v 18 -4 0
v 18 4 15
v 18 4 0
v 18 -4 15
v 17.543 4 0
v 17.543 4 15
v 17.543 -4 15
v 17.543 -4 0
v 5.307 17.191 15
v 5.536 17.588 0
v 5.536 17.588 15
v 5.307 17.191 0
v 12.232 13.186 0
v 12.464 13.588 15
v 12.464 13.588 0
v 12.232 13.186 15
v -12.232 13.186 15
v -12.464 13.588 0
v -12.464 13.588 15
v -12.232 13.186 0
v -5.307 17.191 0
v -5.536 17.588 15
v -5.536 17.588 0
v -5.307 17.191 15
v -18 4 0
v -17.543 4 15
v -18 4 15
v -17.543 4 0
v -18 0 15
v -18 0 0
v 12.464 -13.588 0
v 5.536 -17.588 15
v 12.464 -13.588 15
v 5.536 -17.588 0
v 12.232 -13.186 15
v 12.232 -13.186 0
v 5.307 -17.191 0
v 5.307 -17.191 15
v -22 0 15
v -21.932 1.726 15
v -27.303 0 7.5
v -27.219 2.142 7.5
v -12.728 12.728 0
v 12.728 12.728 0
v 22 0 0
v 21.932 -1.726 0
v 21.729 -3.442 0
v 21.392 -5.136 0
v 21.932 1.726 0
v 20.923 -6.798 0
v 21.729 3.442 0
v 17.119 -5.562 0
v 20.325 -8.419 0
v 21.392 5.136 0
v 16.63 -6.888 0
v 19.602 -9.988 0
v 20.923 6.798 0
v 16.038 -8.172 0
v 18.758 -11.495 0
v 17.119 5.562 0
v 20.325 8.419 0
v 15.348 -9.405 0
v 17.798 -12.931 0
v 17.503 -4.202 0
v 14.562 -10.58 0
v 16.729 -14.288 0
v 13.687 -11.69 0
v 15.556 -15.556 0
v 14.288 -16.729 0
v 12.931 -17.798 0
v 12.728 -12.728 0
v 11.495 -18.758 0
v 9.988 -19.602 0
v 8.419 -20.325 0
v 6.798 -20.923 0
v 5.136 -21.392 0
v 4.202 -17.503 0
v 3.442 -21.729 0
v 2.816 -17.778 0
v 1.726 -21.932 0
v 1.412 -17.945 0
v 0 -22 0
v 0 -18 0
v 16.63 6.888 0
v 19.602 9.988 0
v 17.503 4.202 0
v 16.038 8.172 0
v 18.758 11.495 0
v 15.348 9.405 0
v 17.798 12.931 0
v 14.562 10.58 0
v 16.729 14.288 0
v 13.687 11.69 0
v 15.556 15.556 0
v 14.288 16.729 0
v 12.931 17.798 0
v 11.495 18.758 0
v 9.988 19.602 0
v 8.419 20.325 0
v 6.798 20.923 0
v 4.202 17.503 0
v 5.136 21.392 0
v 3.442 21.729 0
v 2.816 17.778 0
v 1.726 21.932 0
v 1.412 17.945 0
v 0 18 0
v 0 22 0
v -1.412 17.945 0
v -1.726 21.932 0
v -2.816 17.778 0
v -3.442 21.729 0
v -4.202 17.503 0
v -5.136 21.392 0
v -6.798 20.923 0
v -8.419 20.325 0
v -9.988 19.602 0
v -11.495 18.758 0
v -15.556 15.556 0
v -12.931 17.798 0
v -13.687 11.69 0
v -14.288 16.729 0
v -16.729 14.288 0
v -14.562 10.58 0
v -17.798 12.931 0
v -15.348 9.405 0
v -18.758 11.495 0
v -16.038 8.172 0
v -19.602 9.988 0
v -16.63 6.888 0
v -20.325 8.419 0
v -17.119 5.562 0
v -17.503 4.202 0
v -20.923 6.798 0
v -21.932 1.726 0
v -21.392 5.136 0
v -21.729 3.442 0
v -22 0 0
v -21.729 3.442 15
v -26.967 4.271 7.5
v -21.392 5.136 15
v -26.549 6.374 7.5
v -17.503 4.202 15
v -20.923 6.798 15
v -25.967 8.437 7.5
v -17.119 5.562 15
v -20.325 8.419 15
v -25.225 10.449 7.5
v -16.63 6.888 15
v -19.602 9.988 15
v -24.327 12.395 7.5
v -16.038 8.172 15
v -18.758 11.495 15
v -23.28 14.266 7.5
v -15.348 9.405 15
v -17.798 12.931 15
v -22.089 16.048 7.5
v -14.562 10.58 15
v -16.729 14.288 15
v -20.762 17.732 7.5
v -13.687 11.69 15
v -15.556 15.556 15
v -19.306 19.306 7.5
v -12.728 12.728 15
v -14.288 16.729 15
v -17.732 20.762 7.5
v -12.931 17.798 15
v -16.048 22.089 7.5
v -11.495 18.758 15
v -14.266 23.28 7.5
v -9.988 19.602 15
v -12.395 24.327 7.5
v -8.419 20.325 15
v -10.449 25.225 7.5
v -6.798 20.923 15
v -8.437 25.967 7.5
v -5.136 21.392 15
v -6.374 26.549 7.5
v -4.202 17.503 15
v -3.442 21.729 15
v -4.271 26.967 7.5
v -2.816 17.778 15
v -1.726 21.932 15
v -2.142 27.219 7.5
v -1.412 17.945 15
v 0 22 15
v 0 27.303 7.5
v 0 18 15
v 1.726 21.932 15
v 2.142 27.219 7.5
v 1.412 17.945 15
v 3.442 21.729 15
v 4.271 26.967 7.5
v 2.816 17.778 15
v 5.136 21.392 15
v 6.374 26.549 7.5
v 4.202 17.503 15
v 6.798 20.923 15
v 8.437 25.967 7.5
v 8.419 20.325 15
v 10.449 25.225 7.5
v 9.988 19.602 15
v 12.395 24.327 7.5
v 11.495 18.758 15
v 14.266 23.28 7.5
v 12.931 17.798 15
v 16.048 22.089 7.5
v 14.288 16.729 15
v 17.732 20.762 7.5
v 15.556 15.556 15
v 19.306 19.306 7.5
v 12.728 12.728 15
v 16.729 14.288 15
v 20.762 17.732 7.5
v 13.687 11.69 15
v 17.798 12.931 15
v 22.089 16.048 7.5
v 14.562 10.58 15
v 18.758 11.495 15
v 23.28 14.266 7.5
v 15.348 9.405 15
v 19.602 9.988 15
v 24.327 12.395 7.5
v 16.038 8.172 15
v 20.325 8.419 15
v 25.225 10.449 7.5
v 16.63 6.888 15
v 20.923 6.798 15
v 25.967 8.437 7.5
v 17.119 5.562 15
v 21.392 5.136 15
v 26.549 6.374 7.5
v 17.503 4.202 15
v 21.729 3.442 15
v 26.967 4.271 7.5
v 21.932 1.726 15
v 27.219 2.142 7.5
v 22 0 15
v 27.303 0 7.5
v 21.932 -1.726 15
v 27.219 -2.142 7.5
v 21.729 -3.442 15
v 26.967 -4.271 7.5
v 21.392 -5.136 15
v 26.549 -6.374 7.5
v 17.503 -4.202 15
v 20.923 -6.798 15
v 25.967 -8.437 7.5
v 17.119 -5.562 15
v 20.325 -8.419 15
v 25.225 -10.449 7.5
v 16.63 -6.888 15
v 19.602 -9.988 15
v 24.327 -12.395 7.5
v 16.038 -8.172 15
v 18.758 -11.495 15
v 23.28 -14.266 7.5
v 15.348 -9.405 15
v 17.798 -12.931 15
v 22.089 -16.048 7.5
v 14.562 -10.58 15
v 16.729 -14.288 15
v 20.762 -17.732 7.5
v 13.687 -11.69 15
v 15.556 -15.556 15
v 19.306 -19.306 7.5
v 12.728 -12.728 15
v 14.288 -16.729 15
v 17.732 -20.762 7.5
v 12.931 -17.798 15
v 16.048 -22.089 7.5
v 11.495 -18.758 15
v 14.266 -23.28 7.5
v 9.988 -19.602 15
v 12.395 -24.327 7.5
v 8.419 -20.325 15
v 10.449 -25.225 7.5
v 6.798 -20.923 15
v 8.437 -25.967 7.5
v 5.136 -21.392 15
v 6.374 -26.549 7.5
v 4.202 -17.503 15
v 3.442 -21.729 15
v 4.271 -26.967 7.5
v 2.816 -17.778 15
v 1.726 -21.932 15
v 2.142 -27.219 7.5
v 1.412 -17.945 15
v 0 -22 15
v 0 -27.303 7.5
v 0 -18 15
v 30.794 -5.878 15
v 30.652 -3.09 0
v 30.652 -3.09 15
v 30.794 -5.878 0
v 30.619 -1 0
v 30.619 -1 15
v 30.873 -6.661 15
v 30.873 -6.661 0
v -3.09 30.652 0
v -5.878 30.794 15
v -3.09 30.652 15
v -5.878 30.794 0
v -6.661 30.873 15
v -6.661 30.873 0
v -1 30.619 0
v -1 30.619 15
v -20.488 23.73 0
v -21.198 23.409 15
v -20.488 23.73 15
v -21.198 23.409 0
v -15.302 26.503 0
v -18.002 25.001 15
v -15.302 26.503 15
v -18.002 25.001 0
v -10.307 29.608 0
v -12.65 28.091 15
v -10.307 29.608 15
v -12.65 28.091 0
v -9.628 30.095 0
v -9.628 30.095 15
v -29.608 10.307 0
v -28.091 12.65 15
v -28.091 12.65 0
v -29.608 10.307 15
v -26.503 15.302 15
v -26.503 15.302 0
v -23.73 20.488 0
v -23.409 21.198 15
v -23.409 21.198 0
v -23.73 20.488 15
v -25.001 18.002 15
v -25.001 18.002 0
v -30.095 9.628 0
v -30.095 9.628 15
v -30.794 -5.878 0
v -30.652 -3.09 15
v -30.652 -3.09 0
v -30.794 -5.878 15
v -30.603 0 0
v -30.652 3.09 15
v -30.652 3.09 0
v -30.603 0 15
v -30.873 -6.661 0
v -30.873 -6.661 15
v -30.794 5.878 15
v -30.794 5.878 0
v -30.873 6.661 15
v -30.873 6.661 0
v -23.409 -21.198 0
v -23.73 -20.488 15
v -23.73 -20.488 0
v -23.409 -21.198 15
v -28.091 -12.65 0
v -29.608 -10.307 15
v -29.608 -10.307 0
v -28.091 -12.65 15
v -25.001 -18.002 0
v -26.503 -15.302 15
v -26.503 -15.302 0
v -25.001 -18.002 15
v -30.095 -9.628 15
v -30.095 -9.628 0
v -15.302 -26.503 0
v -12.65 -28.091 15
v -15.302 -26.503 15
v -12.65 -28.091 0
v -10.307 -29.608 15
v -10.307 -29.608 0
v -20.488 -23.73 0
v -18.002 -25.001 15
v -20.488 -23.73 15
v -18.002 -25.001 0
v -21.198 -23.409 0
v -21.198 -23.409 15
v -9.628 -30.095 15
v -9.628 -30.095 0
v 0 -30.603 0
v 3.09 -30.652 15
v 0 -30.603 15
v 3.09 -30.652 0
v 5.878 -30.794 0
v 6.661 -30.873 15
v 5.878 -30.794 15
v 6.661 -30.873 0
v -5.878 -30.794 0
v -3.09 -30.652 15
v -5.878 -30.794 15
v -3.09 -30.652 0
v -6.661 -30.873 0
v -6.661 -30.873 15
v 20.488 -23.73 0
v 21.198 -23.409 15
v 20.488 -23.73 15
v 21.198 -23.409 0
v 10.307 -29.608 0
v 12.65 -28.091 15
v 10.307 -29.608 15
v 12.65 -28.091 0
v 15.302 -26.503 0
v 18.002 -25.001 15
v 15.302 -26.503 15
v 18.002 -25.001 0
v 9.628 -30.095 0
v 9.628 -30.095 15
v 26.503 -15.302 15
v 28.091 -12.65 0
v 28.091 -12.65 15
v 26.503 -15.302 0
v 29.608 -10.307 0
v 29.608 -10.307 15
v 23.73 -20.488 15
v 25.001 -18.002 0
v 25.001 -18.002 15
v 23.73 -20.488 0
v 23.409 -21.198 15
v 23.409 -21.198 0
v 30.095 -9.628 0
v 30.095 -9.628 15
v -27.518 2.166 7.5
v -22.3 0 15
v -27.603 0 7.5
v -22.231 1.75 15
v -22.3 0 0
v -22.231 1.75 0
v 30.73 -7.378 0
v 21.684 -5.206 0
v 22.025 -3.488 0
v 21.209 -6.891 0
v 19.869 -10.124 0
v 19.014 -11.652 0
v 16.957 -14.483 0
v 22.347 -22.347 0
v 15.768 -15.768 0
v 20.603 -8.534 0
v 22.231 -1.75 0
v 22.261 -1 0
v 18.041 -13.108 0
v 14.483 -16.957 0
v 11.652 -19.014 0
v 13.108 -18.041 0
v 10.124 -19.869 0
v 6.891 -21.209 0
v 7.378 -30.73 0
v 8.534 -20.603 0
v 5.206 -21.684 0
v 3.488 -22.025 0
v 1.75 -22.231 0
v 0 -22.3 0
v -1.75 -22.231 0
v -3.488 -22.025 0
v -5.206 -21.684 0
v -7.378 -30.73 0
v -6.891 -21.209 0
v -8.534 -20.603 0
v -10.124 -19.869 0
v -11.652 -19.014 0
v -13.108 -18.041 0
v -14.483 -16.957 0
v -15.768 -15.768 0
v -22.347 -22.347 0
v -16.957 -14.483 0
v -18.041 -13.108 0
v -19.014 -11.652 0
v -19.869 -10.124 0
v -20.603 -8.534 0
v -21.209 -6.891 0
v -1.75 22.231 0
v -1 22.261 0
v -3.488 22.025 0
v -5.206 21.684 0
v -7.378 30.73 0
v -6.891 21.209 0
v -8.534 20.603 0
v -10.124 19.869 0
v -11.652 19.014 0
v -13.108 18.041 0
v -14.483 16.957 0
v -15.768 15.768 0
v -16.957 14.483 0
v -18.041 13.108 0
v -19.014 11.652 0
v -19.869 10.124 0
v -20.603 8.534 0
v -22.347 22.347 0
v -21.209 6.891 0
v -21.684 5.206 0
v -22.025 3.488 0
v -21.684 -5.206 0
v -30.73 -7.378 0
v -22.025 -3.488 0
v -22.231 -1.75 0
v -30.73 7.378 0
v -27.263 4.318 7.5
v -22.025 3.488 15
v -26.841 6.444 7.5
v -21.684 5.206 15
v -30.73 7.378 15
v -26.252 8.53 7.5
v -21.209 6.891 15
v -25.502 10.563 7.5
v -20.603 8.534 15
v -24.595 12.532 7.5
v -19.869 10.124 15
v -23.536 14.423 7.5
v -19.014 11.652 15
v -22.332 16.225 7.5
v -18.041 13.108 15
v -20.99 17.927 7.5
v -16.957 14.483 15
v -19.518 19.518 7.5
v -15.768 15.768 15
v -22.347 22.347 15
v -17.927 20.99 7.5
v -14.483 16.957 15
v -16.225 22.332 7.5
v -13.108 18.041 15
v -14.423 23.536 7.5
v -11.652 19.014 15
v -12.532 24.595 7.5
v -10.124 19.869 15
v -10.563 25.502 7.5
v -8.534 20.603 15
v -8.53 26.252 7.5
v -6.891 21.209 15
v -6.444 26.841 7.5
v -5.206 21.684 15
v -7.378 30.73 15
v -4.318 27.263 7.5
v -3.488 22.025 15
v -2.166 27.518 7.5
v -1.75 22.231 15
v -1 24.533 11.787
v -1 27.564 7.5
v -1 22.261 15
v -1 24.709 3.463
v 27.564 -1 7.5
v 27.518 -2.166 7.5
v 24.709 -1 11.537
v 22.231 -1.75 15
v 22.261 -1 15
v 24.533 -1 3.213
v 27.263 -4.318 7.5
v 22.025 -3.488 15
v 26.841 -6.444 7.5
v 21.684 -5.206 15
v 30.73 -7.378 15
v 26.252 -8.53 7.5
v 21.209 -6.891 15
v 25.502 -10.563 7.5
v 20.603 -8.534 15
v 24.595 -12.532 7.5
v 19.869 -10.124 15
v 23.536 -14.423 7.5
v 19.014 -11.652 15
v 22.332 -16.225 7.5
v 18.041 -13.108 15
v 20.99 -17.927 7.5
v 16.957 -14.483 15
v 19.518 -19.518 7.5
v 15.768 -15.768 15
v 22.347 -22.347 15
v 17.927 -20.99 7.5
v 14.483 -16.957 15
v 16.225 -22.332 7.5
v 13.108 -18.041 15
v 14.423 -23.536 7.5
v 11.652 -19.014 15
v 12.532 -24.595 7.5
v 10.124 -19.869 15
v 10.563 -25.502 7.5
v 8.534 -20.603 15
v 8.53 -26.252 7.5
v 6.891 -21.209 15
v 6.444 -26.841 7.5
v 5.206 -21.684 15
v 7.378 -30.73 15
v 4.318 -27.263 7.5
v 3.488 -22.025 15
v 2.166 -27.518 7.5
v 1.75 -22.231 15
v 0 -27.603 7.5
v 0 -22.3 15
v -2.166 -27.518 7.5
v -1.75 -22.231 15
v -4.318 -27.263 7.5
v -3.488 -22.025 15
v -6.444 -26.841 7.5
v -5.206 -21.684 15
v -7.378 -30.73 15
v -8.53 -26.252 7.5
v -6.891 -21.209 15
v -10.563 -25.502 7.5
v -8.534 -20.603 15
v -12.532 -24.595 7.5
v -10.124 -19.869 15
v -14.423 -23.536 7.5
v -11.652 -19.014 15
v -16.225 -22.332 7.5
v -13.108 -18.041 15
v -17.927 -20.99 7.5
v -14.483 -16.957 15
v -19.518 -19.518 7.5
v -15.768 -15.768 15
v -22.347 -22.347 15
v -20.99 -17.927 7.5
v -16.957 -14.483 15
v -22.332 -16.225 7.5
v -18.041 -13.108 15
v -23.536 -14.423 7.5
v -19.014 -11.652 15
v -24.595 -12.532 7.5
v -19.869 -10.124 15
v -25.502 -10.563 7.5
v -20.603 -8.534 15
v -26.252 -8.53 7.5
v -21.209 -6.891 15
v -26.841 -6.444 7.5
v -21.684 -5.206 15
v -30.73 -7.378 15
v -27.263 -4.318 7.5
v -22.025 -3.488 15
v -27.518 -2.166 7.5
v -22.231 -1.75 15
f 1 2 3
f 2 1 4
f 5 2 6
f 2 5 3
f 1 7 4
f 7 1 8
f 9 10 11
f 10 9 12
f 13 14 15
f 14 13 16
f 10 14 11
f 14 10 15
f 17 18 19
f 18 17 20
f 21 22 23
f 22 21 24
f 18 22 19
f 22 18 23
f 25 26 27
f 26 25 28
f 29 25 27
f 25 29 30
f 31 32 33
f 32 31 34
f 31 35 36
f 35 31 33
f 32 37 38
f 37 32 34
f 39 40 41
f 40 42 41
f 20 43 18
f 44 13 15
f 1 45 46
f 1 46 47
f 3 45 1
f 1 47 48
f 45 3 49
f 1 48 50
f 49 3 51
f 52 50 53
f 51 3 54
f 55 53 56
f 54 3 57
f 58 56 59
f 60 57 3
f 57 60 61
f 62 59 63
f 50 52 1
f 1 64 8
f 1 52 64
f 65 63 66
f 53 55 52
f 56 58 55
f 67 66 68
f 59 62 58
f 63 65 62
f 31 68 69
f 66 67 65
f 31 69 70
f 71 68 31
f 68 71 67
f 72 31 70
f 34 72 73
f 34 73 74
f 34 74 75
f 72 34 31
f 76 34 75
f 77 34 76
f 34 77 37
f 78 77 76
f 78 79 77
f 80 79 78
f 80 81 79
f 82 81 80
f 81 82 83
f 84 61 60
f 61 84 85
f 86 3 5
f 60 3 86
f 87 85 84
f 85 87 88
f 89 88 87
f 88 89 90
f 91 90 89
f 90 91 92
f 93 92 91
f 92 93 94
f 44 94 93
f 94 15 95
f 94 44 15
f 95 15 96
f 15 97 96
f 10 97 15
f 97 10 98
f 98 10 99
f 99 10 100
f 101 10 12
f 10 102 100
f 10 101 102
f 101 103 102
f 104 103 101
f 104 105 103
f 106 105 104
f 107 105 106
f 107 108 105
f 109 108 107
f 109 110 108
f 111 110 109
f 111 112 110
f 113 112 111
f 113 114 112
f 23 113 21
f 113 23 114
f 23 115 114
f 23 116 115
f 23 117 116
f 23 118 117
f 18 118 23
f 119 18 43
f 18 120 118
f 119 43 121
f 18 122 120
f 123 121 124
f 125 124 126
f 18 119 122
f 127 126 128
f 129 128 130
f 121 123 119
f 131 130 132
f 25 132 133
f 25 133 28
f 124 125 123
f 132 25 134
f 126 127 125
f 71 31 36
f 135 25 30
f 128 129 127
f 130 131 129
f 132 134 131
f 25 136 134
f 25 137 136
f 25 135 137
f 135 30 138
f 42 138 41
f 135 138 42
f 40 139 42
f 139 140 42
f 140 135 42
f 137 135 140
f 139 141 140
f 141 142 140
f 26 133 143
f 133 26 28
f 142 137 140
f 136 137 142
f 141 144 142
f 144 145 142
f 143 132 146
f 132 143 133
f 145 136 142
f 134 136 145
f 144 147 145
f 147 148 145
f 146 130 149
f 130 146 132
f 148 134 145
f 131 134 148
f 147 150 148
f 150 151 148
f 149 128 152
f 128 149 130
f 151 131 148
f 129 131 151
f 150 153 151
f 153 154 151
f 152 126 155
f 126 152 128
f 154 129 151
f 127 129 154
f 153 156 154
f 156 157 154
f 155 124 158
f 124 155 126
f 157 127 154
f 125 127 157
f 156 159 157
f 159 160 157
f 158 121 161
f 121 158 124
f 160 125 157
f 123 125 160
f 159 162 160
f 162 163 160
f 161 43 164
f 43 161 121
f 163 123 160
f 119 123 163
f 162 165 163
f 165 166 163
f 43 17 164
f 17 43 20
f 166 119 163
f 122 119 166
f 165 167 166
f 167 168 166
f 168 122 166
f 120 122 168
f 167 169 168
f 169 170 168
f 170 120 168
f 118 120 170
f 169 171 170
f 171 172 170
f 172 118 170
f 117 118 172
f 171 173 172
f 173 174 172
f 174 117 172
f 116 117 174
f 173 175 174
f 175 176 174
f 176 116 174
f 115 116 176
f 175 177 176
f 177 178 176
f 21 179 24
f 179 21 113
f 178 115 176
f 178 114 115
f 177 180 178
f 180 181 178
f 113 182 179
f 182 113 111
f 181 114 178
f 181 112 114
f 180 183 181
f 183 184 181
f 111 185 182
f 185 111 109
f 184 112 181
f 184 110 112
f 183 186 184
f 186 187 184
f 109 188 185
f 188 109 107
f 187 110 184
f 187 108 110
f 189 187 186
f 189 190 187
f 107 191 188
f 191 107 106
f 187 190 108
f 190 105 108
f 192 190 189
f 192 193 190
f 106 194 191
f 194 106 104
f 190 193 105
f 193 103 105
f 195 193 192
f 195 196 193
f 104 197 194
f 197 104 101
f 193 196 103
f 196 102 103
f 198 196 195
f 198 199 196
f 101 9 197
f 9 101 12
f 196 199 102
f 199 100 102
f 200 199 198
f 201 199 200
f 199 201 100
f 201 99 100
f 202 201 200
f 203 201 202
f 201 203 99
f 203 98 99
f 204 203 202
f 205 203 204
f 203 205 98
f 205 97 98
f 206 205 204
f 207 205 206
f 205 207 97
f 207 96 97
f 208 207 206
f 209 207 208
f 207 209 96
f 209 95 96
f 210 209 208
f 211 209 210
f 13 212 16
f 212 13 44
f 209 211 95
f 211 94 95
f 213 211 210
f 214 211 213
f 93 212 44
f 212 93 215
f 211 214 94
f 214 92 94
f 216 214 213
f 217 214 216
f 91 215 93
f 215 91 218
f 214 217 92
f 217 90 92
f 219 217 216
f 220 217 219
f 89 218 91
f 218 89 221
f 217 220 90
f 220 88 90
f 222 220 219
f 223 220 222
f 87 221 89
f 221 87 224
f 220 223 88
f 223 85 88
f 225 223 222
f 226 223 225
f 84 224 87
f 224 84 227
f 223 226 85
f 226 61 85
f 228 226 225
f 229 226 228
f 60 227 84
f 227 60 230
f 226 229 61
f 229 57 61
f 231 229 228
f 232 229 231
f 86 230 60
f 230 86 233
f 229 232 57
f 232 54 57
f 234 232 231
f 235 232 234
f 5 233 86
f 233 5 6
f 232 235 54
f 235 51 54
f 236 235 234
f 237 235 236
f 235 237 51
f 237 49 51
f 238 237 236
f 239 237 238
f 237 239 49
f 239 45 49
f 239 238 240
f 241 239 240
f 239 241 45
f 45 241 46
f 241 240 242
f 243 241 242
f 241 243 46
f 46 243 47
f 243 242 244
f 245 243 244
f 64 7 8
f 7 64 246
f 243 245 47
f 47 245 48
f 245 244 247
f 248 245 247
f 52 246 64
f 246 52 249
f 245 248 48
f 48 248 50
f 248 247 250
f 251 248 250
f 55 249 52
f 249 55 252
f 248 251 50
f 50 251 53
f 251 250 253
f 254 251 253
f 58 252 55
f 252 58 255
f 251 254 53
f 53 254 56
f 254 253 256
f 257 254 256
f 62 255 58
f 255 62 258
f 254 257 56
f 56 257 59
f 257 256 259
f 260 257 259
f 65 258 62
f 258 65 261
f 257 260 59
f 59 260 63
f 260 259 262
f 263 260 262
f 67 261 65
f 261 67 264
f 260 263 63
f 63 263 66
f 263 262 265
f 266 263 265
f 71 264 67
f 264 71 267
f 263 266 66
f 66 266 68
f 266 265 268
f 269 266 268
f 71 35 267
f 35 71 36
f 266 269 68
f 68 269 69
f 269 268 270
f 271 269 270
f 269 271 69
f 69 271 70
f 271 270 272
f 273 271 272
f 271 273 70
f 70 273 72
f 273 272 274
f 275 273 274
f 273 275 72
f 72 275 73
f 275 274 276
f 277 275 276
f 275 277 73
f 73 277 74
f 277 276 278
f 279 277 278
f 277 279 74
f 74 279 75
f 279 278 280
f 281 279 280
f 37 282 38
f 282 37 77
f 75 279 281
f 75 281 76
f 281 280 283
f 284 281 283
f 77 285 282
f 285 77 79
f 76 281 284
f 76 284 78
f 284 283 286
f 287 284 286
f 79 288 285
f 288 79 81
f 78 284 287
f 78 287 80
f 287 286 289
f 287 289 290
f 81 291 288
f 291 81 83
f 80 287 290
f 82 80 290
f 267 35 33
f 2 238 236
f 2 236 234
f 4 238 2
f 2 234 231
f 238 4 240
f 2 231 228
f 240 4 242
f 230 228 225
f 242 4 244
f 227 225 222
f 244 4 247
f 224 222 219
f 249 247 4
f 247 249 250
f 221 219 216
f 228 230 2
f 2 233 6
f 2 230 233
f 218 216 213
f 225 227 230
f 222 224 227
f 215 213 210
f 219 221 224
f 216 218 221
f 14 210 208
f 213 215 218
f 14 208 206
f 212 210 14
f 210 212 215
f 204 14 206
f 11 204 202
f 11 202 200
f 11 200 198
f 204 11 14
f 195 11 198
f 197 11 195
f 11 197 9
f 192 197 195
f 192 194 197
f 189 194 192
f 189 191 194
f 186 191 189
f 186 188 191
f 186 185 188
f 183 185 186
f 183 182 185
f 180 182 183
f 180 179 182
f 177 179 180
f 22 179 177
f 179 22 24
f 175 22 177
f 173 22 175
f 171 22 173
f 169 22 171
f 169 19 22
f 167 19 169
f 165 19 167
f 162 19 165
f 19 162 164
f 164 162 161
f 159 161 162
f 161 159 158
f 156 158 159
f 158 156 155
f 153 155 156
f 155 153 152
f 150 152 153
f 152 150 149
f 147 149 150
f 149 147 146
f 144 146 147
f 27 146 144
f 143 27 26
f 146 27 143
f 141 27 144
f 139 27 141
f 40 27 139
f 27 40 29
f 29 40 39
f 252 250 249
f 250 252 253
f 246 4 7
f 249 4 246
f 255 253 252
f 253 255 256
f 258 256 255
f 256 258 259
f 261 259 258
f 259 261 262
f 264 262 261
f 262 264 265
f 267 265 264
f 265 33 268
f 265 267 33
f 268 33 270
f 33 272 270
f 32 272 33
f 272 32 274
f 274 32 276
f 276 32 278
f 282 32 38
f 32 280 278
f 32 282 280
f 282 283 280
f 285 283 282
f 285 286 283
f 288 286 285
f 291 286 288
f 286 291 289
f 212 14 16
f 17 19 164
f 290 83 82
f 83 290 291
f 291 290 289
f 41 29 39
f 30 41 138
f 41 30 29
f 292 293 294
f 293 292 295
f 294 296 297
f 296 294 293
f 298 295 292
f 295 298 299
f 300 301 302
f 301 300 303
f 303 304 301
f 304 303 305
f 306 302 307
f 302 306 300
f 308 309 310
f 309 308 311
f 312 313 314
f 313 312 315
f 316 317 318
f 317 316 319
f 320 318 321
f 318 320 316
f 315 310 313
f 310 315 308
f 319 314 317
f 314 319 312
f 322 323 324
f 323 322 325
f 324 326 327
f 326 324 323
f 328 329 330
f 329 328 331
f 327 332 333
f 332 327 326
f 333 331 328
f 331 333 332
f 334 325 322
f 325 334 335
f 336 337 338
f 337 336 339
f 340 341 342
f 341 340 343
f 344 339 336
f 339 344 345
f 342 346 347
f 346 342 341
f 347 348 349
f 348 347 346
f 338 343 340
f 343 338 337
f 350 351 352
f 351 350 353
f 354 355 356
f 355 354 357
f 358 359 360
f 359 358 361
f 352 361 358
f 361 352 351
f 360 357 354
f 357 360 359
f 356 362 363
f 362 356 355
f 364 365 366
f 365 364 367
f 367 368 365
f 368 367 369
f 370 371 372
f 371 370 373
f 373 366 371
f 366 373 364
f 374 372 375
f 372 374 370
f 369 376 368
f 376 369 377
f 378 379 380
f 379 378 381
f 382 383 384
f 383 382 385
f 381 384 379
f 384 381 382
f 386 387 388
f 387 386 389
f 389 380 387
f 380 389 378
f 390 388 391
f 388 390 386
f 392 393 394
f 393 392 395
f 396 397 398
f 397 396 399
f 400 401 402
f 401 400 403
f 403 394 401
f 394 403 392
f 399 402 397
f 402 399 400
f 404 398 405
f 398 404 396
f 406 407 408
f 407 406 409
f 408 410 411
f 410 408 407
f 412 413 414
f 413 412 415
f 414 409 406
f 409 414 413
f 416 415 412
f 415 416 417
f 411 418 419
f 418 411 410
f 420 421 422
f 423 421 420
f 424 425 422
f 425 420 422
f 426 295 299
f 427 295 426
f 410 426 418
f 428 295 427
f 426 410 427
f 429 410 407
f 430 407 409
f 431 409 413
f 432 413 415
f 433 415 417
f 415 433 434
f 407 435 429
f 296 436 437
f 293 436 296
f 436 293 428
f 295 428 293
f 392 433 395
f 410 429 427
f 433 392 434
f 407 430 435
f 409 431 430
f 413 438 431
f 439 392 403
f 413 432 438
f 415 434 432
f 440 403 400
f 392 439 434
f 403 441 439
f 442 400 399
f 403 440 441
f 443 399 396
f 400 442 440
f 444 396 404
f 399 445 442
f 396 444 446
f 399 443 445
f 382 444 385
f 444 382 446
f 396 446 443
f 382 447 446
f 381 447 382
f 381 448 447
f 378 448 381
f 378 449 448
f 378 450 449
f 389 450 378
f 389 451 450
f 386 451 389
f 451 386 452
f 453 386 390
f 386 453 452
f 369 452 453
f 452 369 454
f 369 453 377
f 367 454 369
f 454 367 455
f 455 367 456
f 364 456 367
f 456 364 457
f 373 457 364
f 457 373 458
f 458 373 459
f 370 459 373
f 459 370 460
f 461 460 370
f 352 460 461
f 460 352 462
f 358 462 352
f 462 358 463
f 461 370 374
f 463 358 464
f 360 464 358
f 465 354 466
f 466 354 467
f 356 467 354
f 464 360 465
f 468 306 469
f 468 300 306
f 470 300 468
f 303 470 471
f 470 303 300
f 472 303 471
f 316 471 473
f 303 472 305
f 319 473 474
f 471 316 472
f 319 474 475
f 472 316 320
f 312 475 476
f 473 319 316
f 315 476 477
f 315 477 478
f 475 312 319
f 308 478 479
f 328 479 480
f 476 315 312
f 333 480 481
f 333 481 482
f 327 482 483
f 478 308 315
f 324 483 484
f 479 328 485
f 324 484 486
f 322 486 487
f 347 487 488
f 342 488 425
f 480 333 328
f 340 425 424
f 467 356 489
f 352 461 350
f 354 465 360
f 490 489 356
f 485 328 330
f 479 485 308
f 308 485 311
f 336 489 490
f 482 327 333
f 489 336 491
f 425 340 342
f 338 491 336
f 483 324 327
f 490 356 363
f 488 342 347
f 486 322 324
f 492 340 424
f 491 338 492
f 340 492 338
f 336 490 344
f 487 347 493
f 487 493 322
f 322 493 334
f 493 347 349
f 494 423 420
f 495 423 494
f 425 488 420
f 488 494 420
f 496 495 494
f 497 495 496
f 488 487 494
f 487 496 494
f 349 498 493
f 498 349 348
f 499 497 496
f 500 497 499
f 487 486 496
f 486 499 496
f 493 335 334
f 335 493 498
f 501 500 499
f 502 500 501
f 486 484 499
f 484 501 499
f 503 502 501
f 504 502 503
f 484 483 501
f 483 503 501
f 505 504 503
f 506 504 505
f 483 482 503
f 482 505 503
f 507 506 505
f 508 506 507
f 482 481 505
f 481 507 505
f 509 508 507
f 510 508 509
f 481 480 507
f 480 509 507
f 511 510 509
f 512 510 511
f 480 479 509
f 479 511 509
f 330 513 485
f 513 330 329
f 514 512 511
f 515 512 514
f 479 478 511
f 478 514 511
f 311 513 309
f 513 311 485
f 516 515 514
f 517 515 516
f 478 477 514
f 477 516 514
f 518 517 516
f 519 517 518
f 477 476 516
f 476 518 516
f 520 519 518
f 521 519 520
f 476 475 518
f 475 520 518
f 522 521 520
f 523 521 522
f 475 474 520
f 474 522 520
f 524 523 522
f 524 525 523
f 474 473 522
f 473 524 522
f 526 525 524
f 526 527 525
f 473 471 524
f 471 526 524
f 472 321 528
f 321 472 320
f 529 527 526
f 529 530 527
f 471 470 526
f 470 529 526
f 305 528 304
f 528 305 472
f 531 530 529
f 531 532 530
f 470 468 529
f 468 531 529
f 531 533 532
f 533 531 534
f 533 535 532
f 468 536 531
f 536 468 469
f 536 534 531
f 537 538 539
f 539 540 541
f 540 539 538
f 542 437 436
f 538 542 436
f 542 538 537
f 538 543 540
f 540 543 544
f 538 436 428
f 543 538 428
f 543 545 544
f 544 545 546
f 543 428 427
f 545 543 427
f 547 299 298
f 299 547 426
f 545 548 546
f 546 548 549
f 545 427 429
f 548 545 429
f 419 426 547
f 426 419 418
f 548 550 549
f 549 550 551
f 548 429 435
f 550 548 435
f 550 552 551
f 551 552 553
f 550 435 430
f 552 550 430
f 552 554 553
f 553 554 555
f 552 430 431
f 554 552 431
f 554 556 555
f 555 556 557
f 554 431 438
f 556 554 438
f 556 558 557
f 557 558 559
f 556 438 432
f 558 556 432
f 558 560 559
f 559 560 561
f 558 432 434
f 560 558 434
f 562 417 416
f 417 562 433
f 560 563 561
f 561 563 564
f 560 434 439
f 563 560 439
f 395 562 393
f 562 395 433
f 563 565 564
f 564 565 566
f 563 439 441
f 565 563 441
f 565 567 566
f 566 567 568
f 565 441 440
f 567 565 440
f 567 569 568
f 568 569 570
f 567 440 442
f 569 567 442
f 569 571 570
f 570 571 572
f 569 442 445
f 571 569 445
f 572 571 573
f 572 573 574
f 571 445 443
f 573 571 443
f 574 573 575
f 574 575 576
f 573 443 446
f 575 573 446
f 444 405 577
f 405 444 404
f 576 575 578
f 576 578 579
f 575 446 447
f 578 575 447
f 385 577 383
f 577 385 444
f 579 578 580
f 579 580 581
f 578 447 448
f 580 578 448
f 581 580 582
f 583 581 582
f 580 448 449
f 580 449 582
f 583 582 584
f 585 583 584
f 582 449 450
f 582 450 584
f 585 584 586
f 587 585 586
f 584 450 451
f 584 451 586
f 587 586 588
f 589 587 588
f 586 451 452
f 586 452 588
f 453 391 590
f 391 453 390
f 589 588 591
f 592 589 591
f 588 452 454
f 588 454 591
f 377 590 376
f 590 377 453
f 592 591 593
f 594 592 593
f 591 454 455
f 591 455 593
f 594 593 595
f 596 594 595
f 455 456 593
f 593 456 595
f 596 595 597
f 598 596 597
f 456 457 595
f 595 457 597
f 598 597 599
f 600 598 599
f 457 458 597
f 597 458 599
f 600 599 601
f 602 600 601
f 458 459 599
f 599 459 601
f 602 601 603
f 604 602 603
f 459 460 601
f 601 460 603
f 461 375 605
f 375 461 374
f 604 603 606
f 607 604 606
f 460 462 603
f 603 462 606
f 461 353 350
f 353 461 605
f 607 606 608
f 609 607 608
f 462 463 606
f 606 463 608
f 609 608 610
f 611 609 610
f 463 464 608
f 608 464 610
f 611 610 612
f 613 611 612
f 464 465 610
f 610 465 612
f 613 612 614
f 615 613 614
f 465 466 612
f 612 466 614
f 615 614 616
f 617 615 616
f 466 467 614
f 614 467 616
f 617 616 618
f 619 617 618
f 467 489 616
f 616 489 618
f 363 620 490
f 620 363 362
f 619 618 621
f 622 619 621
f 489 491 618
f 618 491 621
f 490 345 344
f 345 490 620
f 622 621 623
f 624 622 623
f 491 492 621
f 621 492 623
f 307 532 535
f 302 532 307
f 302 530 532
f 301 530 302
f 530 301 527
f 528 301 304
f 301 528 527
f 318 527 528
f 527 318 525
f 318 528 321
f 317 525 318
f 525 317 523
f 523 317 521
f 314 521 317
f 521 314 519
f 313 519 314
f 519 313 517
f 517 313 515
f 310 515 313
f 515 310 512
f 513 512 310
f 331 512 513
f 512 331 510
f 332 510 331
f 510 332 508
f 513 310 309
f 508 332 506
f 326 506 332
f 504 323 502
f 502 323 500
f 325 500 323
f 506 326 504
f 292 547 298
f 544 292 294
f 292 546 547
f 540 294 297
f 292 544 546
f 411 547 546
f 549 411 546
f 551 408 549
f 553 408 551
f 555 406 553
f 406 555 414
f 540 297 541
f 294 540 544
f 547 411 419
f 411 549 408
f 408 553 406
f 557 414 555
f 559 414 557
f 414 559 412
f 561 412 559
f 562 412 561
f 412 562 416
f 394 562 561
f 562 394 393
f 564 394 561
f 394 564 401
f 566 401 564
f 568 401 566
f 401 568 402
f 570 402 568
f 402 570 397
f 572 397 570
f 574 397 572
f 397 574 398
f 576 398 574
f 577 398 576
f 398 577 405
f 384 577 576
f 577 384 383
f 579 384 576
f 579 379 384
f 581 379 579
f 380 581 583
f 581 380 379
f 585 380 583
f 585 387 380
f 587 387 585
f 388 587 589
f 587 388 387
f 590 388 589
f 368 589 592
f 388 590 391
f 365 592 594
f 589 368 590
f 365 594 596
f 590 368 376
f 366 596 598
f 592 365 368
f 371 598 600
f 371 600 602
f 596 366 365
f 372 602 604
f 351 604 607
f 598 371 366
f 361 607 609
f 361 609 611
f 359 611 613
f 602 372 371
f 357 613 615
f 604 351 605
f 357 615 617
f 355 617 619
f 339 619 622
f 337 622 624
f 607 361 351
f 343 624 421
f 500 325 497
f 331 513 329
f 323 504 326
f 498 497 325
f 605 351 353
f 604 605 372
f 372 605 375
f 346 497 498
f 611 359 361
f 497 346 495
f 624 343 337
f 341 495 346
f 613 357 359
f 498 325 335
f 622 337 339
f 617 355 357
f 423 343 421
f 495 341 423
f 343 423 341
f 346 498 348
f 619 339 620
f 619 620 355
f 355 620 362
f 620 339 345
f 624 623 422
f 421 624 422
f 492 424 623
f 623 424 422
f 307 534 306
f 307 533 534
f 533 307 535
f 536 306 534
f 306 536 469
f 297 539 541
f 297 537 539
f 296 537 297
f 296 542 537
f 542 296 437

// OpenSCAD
/* The goal is to replicate a rotating cable "tie".
 * I have one for reference but I lost where I got the orignal from *shrug*
 * units in mm.
 */

height = 15;
gap = 0.3; // printing with a 0.6 mm nozzle. The original seems to be < 0.1
inner_radius= 18;
inner_contact_radius = 4;
half_height = height / 2;
inset_at_half_height = cos(45) * half_height;
outer_radius = inner_radius + inner_contact_radius + inset_at_half_height + gap + 4;

module inner_ring() {
    inner_section_points =
        [
         [inner_radius, 0],
         [inner_radius + inner_contact_radius, 0],
         [inner_radius + inner_contact_radius + inset_at_half_height, half_height],
         [inner_radius + inner_contact_radius, height],
         [inner_radius, height],
        ];

    module full_inner_ring() {
        rotate_extrude($fn = 80) {
            polygon(inner_section_points);
        }
    }

    module inner_grip_slots() {
        sx = 1;
        sy = 8;
        for( r = [0 : 60 : 360] ) {
            rotate(r, [0, 0, 1]) {
                translate([inner_radius - sx, -sy/2, -1 ]) {
                    cube([sx, sy, height + 2]);
                }
            }
        }
    }

    difference() {
        full_inner_ring();
        // sw (-x, -y) chunk if viewed from above
        s = inner_radius + inner_contact_radius + inset_at_half_height;

        // huh.. I guess I could have rotated the profile 270 instead
        translate([-s - 2, -s - 2, -1]) {
            cube(size = [s + 2, s + 2, height + 2]);
        }

        inner_grip_slots();
    }
}

module outer_ring() {
    outer_section_points  =
        [
         [ inner_radius + inner_contact_radius + gap, 0],
         [ outer_radius, 0 ],
         [ outer_radius, height ],
         [ inner_radius + inner_contact_radius + gap, height],
         [ inner_radius + inner_contact_radius + inset_at_half_height + gap, half_height],
         ];
    module full_outer_ring() {
        rotate_extrude($fn = 80) {
            polygon(outer_section_points);
        }
    }

    module outer_grip_slots() {
        sx = 1;
        sy = 10;
        for( r = [0 : 30 : 360] ) {
            rotate(r, [0, 0, 1]) {
                translate([outer_radius, 0, -1 ]) {
                    scale([1, 10, 1]) cylinder(h = height + 2, r = sx, $fn = 20);
                }
            }
        }
    }

    difference() {
        full_outer_ring();
        s = outer_radius;
        translate([-1, -1, -1]) cube(size = [s + 2, s + 2, height + 2]);

        // that is equivalent to the original model. Now for extras
        outer_grip_slots();
    }
}

inner_ring();
outer_ring();
